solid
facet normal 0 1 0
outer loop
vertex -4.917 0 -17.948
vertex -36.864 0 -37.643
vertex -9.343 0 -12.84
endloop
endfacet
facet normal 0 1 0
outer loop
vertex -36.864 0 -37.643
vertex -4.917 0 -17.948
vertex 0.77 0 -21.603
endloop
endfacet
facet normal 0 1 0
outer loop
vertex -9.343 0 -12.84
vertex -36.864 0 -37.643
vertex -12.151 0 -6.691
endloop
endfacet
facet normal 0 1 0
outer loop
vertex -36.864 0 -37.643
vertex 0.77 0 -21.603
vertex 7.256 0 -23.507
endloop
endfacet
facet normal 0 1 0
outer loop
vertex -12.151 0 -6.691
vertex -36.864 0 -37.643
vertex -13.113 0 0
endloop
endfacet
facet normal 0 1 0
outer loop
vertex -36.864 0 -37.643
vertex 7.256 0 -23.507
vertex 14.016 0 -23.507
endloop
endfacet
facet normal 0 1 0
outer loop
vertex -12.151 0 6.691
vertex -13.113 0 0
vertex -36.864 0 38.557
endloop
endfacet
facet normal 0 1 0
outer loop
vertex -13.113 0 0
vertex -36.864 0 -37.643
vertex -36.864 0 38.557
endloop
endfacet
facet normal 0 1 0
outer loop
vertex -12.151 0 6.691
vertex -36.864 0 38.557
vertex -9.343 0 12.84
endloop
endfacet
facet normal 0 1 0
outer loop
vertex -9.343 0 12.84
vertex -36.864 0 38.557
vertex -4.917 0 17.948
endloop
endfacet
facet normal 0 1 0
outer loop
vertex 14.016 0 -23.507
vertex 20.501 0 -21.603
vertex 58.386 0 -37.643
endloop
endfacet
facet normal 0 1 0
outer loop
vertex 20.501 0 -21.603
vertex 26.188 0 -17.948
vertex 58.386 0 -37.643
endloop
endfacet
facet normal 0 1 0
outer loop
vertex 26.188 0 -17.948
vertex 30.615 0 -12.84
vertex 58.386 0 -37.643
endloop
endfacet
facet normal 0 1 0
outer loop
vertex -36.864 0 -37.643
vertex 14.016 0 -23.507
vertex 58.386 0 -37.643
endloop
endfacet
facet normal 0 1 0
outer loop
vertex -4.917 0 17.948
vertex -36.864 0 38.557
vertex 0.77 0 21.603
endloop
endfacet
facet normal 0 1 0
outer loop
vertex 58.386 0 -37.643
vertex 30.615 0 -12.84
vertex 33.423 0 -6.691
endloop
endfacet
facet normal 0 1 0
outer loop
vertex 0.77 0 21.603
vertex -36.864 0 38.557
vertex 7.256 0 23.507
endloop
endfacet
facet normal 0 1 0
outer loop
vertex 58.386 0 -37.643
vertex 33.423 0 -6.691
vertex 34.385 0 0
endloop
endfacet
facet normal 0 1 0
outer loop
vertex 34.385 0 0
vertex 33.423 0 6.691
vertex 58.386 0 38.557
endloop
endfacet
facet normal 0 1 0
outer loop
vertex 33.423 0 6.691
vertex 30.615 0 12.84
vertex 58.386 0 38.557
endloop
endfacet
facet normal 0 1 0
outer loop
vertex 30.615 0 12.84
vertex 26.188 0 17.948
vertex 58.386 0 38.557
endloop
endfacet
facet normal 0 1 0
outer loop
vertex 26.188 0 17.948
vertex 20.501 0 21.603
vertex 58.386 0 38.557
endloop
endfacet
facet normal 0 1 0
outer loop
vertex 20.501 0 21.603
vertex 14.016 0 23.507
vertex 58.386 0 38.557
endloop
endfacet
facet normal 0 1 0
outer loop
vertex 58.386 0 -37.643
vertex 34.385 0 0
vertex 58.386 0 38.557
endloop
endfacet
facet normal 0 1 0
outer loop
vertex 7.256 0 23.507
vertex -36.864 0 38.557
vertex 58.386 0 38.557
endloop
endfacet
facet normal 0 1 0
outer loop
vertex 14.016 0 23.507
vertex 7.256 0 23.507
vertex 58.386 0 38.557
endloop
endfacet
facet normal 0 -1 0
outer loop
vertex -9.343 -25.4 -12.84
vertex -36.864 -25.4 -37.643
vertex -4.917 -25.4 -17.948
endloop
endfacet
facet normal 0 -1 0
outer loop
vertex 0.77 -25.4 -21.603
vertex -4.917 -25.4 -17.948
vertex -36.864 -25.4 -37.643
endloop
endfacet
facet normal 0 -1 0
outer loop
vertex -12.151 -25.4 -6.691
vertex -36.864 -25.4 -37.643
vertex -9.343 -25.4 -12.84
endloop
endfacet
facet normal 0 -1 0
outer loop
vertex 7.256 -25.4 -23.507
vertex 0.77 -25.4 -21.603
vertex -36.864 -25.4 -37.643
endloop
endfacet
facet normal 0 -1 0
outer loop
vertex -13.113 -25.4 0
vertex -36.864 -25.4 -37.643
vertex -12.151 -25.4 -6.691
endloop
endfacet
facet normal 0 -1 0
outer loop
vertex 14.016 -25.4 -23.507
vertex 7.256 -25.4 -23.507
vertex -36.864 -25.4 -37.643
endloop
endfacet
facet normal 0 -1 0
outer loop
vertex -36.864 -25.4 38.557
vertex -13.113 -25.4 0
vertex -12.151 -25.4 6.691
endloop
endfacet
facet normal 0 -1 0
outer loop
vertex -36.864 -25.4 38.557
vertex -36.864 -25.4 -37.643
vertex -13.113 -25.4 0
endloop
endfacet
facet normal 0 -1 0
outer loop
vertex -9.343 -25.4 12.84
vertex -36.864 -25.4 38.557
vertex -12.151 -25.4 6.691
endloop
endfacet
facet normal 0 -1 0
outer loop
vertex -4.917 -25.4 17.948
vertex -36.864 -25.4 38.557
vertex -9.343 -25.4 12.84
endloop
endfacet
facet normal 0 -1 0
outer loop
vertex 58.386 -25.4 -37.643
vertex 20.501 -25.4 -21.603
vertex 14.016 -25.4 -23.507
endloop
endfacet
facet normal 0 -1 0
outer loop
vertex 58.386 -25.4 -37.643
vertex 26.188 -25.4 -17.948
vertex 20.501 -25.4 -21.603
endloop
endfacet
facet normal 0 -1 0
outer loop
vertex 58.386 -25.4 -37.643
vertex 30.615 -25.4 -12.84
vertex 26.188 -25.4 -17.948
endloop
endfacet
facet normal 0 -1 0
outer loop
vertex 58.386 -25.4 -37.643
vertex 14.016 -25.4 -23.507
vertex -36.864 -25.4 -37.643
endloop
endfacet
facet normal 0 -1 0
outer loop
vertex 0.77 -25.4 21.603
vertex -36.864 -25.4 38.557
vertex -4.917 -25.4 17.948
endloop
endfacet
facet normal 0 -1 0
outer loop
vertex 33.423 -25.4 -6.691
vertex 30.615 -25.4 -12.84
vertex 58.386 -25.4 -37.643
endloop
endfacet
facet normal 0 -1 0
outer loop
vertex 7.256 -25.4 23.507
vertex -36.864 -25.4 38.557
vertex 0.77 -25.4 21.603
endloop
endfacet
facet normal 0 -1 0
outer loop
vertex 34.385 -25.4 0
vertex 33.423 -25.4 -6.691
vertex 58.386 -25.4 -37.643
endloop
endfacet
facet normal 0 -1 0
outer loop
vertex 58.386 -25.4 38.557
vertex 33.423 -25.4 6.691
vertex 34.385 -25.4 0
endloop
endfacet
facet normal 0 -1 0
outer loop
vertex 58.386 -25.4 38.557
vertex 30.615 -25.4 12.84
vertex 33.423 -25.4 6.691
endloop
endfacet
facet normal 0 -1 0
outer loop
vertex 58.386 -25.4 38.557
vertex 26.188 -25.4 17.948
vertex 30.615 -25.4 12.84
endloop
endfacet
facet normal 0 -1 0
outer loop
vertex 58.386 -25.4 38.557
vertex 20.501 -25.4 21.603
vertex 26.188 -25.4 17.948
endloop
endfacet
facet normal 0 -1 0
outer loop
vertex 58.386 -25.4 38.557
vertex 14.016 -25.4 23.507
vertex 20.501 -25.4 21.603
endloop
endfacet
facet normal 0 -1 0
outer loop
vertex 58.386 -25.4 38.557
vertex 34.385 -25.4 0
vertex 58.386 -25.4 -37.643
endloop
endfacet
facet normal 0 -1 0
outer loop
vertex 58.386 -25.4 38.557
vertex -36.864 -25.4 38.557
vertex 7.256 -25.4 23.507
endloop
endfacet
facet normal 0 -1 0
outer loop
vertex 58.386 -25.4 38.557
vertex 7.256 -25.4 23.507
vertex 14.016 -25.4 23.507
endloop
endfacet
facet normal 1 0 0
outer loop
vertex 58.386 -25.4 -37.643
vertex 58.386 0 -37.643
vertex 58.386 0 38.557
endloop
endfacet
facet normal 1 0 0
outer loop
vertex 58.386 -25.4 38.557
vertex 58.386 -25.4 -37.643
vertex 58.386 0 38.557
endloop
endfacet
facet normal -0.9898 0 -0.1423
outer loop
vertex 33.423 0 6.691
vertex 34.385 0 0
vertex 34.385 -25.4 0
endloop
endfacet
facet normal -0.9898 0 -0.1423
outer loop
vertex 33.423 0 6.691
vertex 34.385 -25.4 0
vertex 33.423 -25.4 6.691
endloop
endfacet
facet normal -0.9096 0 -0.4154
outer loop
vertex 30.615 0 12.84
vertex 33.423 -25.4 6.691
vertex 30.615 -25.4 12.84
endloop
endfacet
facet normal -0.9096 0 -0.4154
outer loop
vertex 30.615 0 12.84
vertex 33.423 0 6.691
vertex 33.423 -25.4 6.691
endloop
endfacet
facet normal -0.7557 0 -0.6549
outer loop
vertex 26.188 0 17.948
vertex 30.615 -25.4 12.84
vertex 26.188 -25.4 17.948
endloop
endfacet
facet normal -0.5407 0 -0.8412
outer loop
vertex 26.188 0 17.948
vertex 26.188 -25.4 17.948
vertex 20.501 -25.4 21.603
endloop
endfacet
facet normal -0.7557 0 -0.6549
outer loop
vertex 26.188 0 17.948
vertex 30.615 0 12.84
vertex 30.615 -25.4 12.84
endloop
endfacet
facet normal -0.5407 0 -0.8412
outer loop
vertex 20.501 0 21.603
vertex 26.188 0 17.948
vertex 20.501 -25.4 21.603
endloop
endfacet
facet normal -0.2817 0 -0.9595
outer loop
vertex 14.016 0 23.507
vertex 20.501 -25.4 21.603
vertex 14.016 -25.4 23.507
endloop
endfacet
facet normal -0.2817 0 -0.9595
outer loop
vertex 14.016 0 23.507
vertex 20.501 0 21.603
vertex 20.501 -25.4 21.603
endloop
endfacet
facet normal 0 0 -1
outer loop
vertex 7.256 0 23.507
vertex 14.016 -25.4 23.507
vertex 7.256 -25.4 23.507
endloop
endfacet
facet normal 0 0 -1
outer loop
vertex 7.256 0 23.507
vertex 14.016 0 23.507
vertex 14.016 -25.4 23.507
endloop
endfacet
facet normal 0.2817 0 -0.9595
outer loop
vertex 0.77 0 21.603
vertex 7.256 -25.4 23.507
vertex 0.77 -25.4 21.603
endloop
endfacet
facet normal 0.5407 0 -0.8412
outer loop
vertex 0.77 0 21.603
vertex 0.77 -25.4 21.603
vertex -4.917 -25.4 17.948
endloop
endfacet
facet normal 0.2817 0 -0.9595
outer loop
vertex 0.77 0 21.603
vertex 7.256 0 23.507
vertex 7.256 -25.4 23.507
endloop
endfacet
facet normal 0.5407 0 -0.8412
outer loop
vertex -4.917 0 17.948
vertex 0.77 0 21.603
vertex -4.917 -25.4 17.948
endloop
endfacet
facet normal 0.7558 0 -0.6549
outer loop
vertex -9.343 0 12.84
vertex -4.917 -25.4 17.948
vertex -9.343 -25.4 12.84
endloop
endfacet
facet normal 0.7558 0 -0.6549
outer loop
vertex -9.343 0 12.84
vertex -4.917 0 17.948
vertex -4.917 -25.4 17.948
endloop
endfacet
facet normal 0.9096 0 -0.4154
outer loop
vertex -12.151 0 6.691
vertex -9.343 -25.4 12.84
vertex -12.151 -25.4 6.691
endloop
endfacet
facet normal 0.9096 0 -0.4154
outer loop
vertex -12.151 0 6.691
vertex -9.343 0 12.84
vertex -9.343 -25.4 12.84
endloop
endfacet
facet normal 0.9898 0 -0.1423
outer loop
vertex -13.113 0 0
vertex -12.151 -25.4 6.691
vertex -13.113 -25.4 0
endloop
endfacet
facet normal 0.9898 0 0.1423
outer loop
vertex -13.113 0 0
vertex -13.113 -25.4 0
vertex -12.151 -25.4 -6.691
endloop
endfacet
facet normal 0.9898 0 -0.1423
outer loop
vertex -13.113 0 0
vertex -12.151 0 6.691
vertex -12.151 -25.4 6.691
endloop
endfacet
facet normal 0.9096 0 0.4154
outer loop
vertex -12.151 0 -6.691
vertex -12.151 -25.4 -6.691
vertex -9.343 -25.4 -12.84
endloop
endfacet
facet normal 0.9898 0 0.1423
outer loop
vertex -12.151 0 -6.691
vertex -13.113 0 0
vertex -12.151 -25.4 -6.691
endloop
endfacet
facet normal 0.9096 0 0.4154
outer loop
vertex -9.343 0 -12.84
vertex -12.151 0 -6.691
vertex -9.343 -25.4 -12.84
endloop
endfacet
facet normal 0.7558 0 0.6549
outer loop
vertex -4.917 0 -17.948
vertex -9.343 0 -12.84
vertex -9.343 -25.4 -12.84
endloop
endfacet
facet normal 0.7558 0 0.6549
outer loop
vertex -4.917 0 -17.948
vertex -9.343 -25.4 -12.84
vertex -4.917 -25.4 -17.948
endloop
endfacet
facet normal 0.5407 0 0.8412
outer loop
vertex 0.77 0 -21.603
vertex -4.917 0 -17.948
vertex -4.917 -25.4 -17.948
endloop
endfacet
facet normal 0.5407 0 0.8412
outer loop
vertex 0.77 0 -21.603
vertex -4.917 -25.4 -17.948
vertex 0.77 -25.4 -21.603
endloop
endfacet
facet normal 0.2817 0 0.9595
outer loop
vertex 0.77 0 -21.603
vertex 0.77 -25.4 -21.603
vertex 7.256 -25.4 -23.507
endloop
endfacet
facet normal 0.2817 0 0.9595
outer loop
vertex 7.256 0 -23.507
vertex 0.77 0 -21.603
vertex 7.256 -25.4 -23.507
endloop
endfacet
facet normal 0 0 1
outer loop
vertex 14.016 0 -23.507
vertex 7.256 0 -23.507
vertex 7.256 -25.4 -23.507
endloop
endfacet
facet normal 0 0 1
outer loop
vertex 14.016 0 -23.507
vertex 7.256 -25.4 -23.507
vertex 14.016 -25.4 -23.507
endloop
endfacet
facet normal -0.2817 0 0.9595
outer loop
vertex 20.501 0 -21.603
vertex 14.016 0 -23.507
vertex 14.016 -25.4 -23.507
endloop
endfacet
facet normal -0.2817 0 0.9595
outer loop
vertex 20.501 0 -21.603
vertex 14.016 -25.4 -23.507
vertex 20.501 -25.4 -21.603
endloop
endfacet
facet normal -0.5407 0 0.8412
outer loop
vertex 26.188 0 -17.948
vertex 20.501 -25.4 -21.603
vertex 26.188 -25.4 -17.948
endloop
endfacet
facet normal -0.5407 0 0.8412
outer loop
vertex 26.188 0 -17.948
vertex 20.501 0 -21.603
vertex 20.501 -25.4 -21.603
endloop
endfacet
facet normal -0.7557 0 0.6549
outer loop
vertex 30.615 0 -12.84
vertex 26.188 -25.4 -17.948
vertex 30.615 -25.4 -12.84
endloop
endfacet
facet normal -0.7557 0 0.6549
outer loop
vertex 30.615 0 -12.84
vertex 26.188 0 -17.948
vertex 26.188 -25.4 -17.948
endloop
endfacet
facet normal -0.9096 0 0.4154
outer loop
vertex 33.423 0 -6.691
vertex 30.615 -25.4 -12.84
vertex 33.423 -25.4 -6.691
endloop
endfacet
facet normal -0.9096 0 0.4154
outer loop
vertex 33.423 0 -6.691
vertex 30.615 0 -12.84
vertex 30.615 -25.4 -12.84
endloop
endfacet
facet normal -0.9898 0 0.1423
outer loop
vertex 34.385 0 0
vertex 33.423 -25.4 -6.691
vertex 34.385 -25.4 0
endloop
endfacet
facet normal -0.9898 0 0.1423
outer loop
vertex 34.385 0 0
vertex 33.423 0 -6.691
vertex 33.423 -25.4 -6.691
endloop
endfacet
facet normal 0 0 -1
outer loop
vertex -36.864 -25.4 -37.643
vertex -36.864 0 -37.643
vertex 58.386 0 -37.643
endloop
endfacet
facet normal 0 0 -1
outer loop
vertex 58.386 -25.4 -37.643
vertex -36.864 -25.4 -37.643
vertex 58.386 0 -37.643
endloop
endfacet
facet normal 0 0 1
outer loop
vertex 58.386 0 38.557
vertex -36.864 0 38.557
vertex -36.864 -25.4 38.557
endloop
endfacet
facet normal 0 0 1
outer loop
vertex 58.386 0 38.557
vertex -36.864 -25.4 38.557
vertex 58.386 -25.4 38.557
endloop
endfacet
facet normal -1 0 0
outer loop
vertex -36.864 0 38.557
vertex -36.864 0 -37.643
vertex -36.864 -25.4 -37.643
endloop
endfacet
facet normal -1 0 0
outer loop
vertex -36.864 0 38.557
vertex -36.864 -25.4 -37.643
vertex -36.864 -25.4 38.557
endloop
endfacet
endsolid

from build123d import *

# Parameters (mm, degrees)
F0_W     = 95.25
F0_H     = 76.2
F0_R     = 23.749
F1_DEPTH = 25.4
F2_DEPTH = 25.4


with BuildPart() as f1:
    # F0 (on Front) → F1 (new body)
    with BuildSketch(Plane.XZ):
        with Locations((10.760576, 0.456677)):
            Rectangle(F0_W, F0_H)
        with Locations((10.63576, 0)):
            Circle(F0_R, mode=Mode.SUBTRACT)
    extrude(amount=F1_DEPTH)

    # F0 (on Front) → F2 (cut)
    with BuildSketch(Plane.XZ):
        with Locations((10.760576, 0.456677)):
            Rectangle(F0_W, F0_H)
        with Locations((10.63576, 0)):
            Circle(F0_R, mode=Mode.SUBTRACT)
    extrude(amount=-F2_DEPTH, mode=Mode.SUBTRACT)


solid = f1.part
